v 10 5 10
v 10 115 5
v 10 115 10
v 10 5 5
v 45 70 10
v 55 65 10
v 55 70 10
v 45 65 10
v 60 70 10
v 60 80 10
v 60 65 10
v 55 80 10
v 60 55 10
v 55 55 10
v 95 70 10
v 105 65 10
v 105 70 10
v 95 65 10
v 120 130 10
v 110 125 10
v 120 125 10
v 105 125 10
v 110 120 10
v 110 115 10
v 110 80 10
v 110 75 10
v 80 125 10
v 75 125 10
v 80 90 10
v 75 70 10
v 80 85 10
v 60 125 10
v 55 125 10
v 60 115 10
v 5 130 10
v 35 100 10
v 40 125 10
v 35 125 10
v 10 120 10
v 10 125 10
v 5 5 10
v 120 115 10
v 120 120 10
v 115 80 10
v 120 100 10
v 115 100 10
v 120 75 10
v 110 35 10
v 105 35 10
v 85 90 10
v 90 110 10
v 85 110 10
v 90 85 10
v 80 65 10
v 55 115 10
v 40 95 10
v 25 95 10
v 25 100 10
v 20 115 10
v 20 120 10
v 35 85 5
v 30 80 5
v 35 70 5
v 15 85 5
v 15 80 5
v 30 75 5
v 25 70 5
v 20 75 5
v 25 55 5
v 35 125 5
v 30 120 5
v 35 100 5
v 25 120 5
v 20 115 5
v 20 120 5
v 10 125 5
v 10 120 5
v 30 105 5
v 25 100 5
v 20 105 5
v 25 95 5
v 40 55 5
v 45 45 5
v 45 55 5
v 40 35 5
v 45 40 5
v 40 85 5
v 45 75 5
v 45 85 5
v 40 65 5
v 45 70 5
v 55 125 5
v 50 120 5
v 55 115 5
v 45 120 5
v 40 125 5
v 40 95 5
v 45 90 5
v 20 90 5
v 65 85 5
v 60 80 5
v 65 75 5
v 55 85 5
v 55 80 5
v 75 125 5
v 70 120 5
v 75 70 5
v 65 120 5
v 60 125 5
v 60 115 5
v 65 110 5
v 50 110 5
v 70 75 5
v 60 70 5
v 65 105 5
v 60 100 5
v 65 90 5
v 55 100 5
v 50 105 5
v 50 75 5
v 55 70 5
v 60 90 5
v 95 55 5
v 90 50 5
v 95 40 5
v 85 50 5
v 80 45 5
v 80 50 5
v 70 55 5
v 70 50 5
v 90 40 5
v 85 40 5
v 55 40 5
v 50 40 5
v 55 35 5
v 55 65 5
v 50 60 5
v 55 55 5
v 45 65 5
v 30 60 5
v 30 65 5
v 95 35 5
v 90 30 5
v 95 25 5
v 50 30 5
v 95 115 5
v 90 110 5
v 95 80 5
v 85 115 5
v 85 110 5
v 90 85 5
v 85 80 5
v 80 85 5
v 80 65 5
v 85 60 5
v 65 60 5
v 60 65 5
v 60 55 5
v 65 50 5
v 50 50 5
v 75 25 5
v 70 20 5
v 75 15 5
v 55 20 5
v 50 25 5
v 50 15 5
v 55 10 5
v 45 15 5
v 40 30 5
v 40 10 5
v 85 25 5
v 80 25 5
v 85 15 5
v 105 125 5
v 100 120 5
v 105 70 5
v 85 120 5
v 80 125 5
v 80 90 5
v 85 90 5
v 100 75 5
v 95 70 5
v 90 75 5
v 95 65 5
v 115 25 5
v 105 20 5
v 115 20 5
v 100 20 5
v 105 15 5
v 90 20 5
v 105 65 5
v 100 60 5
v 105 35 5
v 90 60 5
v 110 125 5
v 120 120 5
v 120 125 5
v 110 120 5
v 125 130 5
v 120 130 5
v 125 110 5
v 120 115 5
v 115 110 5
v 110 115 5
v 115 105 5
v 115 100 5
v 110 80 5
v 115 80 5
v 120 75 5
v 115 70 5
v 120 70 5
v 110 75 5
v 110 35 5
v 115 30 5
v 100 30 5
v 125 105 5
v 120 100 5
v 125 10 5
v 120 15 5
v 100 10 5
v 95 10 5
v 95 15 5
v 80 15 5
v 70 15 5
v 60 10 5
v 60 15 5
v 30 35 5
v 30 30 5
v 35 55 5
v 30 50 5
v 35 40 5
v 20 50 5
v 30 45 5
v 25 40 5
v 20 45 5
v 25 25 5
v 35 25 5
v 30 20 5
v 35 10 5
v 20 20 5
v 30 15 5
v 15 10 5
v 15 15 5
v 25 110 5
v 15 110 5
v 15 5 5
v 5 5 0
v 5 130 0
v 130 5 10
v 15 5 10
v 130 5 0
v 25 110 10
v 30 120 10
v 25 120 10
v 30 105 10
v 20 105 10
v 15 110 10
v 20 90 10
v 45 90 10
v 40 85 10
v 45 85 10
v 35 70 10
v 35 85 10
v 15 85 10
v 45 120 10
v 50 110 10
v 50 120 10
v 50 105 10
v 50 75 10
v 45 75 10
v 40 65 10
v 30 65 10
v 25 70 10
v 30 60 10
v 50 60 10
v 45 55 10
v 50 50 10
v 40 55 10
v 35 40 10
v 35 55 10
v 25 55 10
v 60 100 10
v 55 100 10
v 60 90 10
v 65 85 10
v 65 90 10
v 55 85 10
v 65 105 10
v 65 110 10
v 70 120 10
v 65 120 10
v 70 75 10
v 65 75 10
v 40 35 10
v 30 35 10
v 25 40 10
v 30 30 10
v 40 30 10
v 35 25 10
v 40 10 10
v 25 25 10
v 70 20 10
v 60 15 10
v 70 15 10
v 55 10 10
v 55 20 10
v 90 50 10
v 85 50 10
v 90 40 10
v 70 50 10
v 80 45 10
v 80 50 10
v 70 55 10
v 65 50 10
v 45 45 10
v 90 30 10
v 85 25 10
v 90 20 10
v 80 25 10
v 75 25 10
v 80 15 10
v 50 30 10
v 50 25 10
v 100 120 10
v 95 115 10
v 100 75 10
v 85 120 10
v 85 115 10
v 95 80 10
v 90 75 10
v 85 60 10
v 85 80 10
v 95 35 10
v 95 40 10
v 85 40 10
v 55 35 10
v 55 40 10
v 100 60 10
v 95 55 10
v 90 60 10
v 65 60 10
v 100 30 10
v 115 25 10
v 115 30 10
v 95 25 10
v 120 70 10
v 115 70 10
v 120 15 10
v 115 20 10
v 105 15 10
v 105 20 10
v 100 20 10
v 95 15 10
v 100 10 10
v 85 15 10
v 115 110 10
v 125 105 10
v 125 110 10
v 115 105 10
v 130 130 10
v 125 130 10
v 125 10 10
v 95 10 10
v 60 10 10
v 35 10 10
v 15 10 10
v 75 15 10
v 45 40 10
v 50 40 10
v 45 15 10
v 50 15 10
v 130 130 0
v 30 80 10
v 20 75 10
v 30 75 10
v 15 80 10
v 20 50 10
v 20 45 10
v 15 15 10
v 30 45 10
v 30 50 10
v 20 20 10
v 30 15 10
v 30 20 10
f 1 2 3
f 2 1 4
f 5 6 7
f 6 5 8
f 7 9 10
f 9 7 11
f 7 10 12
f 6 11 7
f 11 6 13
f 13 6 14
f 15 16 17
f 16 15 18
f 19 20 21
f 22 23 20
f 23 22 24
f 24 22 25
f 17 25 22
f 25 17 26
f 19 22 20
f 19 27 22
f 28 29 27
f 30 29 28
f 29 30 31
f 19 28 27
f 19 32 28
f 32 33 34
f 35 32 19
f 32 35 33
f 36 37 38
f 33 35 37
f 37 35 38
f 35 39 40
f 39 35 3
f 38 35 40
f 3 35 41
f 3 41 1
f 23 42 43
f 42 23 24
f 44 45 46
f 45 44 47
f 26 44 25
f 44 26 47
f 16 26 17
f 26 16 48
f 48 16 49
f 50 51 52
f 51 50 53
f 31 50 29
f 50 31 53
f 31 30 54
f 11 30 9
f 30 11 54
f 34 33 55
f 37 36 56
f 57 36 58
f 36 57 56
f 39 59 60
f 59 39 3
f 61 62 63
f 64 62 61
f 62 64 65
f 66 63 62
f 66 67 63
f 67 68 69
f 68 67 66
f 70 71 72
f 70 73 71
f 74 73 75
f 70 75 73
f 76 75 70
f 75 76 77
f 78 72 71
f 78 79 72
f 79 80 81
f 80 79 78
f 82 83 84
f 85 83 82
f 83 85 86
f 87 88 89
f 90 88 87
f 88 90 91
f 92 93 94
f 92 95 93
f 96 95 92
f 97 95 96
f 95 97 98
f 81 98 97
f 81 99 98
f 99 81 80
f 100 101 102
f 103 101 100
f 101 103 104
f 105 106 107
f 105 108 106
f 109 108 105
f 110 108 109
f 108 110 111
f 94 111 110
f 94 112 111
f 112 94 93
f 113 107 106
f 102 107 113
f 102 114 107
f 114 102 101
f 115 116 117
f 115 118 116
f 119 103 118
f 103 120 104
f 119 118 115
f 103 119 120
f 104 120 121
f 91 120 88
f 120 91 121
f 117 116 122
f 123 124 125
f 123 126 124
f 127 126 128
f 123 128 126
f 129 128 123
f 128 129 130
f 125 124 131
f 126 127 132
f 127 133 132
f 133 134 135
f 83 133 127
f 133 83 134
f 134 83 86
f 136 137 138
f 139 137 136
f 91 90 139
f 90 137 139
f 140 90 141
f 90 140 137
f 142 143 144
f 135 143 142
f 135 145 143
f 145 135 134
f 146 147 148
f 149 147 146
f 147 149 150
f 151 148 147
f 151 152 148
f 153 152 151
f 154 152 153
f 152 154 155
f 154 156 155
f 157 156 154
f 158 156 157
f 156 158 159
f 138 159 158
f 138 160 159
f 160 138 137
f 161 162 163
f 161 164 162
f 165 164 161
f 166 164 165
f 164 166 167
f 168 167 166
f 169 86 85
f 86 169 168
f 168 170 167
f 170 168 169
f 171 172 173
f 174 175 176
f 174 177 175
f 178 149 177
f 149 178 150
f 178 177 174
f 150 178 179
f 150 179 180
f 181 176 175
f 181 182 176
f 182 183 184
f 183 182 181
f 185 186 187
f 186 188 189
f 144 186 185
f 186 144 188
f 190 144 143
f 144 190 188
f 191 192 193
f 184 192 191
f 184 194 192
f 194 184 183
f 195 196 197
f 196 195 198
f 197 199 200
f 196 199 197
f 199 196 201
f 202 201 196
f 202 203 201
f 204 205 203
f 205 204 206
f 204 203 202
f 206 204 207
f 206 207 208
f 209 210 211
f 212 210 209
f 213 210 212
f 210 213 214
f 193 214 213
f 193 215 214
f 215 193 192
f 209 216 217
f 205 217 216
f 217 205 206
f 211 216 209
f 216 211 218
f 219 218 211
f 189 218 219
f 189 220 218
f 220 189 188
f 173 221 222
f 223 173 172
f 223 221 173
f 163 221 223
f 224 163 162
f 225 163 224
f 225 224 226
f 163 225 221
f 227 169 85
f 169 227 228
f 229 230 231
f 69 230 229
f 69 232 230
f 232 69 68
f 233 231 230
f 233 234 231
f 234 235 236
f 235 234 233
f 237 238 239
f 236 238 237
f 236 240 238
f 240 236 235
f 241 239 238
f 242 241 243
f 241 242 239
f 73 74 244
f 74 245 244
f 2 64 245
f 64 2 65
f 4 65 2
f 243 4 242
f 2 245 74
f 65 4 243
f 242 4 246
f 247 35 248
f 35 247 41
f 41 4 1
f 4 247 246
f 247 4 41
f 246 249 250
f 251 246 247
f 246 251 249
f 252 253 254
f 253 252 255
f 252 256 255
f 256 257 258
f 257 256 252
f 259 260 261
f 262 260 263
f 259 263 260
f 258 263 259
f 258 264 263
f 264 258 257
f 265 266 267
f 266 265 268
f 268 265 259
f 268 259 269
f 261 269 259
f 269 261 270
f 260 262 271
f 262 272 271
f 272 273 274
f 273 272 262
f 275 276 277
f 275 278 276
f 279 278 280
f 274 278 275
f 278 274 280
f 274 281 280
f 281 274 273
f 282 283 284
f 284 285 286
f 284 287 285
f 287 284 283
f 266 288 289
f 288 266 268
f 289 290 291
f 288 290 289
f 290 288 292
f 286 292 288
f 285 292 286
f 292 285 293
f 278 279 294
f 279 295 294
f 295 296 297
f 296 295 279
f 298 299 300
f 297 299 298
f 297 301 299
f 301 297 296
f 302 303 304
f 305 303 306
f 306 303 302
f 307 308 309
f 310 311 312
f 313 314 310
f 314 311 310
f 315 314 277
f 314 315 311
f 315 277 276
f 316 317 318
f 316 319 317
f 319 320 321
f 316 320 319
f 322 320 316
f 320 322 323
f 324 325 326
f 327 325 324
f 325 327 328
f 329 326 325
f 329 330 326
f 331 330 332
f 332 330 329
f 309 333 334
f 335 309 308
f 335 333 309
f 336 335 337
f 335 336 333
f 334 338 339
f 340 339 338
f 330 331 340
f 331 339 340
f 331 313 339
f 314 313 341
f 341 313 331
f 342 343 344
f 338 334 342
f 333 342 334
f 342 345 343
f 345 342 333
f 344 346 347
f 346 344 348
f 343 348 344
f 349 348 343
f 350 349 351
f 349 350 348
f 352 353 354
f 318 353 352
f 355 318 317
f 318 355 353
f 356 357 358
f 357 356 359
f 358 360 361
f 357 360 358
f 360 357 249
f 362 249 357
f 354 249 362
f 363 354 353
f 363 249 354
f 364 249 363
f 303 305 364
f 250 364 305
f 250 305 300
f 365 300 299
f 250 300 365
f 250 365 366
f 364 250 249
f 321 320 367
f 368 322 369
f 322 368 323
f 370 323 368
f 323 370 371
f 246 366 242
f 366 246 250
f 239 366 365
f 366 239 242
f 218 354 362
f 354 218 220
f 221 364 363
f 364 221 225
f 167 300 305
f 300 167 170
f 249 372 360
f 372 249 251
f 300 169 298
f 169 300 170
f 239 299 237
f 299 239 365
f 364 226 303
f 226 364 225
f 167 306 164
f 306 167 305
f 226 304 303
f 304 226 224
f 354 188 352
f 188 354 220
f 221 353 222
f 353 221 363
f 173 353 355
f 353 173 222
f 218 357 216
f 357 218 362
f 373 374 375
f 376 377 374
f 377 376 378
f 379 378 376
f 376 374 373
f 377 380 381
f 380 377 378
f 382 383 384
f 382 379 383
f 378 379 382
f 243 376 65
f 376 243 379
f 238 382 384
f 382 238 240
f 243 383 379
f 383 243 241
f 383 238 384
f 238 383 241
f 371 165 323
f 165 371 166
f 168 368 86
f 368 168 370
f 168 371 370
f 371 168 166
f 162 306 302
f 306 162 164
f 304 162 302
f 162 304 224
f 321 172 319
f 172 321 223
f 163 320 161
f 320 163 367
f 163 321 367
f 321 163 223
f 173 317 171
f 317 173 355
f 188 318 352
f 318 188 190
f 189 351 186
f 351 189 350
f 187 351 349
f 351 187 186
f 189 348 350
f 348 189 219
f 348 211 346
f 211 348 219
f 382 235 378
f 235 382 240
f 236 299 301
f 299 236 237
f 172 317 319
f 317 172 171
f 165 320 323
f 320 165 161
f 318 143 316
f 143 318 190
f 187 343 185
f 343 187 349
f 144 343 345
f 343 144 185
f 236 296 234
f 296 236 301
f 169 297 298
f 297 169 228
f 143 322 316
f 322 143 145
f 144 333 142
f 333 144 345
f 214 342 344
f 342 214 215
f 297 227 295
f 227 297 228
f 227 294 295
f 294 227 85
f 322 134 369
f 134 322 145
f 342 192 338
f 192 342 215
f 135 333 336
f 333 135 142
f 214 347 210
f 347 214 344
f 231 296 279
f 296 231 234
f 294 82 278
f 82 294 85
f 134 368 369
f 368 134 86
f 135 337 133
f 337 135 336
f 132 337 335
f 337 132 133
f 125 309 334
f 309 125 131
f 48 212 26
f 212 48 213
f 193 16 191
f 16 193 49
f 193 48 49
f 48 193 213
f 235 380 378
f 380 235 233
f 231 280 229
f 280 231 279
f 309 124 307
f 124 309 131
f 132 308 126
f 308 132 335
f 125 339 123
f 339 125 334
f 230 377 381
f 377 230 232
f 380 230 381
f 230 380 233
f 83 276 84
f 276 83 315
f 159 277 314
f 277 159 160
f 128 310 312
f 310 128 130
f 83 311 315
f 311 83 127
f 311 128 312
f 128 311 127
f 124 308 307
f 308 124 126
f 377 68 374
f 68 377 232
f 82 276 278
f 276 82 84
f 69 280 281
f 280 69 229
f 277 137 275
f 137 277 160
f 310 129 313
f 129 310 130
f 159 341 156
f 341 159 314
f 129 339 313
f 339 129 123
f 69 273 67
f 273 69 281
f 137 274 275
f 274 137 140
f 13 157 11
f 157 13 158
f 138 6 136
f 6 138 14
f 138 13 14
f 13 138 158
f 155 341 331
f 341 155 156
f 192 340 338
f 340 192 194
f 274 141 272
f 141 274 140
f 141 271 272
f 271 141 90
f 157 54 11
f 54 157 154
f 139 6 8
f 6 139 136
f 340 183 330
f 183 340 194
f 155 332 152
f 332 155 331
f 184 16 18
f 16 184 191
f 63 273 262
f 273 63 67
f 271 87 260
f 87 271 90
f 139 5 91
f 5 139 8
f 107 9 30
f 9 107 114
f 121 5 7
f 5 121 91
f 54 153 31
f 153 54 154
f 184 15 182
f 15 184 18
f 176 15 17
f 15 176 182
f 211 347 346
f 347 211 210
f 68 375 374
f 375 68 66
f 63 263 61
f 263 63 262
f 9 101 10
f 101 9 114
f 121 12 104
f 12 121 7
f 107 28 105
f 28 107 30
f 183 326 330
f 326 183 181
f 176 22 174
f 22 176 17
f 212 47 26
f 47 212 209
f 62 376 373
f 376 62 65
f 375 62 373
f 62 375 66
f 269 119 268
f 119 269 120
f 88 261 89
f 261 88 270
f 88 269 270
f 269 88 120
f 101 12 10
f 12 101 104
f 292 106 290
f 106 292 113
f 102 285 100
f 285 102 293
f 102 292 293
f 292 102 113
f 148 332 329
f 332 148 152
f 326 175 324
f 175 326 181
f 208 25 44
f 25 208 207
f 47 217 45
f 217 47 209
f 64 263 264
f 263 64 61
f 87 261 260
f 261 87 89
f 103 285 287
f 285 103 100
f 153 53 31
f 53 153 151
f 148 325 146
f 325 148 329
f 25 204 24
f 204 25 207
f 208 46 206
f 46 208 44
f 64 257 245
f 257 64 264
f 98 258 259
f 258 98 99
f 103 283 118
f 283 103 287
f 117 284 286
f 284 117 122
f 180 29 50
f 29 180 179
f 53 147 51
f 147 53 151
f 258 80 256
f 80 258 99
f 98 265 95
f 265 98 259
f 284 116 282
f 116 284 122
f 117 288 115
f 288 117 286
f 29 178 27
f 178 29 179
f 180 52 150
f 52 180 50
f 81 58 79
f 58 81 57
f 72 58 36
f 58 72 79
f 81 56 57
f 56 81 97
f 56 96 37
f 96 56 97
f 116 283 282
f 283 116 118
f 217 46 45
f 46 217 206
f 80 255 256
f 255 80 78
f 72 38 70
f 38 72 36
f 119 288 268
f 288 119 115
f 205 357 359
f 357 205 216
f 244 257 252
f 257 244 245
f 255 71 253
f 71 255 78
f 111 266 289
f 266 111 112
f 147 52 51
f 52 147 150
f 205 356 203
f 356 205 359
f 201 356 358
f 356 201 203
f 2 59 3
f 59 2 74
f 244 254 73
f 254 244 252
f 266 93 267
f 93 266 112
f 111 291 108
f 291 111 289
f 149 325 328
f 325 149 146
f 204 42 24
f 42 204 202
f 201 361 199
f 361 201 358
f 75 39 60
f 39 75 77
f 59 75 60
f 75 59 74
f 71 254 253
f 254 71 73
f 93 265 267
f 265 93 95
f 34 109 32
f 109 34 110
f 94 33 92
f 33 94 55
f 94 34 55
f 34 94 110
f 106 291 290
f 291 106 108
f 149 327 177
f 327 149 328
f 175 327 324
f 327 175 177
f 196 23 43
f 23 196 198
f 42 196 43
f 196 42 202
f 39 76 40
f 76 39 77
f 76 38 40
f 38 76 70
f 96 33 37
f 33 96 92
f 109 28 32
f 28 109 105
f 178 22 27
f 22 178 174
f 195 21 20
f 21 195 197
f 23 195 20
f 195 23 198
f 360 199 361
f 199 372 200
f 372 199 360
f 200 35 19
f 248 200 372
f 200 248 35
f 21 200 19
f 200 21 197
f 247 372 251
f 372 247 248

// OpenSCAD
// Maze Generator
// Joe Wingbermuehle
// 2018-02-19

// Size of each block in mm.
block_size = 5;

// Width and height in blocks.
// Width and height must be odd.
width = 25;
height = 25;

// Determine the next x, y positions based on the direction.
function next_x(dir, x) = (dir == 0 ? x + 1 : (dir == 1 ? x - 1 : x));
function next_y(dir, y) = (dir == 2 ? y + 1 : (dir == 3 ? y - 1 : y));

// Get a new direction.
function new_dir() = round(rands(0, 3, 1)[0]);

// Determine if a coordinate has been visited.
function is_visited(x, y, visited) = len(search(y * width + x, visited)) > 0;

// Visit the specified coordinate.
function visit(x, y, visited) = concat(visited, [y * width + x]);

// Draw the base.
module draw_base() {
   translate([block_size, block_size, 0]) {
      cube([block_size * width, block_size * height, block_size]);
   }
}

// Draw a block at the specified coordinate.
module block(x, y) {
   translate([x * block_size, y * block_size, block_size]) {
      cube([block_size, block_size, block_size]);
   }
}

// Get the next location and the intermediate step.
function take_step(dir, x, y) =
   let(x1 = next_x(dir, x), y1 = next_y(dir, y))
   [x1, y1, next_x(dir, x1), next_y(dir, y1)];

// Determine if it's valid to take a step.
function step_valid(visited, values) =
   let(
      x1 = values[0],
      y1 = values[1],
      x2 = values[2],
      y2 = values[3]
   )
   x2 > 0 && x2 < width && y2 > 0 && y2 < height
   && !is_visited(x1, y1, visited) && !is_visited(x2, y2, visited);

// Take the proposed step.
function carve(visited, values) =
   let(
      x1 = values[0],
      y1 = values[1],
      x2 = values[2],
      y2 = values[3],
      new_visited = visit(x1, y1, visit(x2, y2, visited))
   ) try_directions(new_dir(), 0, x2, y2, new_visited);

// Take the proposed step if it's valid.
function try_carve(dir, x, y, visited) =
   let(new_values = take_step(dir, x, y))
   step_valid(visited, new_values)
   ? carve(visited, new_values)
   : visited;

// From the current coordinate, attempt to move in all directions.
function try_directions(base_dir, count, x, y, visited) =
   let(dir = (base_dir + count) % 4)
   count < 4
   ? let(new_visited = try_carve(dir, x, y, visited))
      try_directions(base_dir, count + 1, x, y, new_visited)
   : visited;

// Generate and draw the maze.
module generate() {
   visited = try_directions(new_dir(), 0, 2, 2, []);
   for(y = [1 : height]) {
      for(x = [1 : width]) {
         if(!(x == 2 && y == 1) && !(x == width - 1 && y == height)) {
            if(!is_visited(x, y, visited)) {
               block(x, y);
            }
         }
      }
   }
}

draw_base();
generate();
